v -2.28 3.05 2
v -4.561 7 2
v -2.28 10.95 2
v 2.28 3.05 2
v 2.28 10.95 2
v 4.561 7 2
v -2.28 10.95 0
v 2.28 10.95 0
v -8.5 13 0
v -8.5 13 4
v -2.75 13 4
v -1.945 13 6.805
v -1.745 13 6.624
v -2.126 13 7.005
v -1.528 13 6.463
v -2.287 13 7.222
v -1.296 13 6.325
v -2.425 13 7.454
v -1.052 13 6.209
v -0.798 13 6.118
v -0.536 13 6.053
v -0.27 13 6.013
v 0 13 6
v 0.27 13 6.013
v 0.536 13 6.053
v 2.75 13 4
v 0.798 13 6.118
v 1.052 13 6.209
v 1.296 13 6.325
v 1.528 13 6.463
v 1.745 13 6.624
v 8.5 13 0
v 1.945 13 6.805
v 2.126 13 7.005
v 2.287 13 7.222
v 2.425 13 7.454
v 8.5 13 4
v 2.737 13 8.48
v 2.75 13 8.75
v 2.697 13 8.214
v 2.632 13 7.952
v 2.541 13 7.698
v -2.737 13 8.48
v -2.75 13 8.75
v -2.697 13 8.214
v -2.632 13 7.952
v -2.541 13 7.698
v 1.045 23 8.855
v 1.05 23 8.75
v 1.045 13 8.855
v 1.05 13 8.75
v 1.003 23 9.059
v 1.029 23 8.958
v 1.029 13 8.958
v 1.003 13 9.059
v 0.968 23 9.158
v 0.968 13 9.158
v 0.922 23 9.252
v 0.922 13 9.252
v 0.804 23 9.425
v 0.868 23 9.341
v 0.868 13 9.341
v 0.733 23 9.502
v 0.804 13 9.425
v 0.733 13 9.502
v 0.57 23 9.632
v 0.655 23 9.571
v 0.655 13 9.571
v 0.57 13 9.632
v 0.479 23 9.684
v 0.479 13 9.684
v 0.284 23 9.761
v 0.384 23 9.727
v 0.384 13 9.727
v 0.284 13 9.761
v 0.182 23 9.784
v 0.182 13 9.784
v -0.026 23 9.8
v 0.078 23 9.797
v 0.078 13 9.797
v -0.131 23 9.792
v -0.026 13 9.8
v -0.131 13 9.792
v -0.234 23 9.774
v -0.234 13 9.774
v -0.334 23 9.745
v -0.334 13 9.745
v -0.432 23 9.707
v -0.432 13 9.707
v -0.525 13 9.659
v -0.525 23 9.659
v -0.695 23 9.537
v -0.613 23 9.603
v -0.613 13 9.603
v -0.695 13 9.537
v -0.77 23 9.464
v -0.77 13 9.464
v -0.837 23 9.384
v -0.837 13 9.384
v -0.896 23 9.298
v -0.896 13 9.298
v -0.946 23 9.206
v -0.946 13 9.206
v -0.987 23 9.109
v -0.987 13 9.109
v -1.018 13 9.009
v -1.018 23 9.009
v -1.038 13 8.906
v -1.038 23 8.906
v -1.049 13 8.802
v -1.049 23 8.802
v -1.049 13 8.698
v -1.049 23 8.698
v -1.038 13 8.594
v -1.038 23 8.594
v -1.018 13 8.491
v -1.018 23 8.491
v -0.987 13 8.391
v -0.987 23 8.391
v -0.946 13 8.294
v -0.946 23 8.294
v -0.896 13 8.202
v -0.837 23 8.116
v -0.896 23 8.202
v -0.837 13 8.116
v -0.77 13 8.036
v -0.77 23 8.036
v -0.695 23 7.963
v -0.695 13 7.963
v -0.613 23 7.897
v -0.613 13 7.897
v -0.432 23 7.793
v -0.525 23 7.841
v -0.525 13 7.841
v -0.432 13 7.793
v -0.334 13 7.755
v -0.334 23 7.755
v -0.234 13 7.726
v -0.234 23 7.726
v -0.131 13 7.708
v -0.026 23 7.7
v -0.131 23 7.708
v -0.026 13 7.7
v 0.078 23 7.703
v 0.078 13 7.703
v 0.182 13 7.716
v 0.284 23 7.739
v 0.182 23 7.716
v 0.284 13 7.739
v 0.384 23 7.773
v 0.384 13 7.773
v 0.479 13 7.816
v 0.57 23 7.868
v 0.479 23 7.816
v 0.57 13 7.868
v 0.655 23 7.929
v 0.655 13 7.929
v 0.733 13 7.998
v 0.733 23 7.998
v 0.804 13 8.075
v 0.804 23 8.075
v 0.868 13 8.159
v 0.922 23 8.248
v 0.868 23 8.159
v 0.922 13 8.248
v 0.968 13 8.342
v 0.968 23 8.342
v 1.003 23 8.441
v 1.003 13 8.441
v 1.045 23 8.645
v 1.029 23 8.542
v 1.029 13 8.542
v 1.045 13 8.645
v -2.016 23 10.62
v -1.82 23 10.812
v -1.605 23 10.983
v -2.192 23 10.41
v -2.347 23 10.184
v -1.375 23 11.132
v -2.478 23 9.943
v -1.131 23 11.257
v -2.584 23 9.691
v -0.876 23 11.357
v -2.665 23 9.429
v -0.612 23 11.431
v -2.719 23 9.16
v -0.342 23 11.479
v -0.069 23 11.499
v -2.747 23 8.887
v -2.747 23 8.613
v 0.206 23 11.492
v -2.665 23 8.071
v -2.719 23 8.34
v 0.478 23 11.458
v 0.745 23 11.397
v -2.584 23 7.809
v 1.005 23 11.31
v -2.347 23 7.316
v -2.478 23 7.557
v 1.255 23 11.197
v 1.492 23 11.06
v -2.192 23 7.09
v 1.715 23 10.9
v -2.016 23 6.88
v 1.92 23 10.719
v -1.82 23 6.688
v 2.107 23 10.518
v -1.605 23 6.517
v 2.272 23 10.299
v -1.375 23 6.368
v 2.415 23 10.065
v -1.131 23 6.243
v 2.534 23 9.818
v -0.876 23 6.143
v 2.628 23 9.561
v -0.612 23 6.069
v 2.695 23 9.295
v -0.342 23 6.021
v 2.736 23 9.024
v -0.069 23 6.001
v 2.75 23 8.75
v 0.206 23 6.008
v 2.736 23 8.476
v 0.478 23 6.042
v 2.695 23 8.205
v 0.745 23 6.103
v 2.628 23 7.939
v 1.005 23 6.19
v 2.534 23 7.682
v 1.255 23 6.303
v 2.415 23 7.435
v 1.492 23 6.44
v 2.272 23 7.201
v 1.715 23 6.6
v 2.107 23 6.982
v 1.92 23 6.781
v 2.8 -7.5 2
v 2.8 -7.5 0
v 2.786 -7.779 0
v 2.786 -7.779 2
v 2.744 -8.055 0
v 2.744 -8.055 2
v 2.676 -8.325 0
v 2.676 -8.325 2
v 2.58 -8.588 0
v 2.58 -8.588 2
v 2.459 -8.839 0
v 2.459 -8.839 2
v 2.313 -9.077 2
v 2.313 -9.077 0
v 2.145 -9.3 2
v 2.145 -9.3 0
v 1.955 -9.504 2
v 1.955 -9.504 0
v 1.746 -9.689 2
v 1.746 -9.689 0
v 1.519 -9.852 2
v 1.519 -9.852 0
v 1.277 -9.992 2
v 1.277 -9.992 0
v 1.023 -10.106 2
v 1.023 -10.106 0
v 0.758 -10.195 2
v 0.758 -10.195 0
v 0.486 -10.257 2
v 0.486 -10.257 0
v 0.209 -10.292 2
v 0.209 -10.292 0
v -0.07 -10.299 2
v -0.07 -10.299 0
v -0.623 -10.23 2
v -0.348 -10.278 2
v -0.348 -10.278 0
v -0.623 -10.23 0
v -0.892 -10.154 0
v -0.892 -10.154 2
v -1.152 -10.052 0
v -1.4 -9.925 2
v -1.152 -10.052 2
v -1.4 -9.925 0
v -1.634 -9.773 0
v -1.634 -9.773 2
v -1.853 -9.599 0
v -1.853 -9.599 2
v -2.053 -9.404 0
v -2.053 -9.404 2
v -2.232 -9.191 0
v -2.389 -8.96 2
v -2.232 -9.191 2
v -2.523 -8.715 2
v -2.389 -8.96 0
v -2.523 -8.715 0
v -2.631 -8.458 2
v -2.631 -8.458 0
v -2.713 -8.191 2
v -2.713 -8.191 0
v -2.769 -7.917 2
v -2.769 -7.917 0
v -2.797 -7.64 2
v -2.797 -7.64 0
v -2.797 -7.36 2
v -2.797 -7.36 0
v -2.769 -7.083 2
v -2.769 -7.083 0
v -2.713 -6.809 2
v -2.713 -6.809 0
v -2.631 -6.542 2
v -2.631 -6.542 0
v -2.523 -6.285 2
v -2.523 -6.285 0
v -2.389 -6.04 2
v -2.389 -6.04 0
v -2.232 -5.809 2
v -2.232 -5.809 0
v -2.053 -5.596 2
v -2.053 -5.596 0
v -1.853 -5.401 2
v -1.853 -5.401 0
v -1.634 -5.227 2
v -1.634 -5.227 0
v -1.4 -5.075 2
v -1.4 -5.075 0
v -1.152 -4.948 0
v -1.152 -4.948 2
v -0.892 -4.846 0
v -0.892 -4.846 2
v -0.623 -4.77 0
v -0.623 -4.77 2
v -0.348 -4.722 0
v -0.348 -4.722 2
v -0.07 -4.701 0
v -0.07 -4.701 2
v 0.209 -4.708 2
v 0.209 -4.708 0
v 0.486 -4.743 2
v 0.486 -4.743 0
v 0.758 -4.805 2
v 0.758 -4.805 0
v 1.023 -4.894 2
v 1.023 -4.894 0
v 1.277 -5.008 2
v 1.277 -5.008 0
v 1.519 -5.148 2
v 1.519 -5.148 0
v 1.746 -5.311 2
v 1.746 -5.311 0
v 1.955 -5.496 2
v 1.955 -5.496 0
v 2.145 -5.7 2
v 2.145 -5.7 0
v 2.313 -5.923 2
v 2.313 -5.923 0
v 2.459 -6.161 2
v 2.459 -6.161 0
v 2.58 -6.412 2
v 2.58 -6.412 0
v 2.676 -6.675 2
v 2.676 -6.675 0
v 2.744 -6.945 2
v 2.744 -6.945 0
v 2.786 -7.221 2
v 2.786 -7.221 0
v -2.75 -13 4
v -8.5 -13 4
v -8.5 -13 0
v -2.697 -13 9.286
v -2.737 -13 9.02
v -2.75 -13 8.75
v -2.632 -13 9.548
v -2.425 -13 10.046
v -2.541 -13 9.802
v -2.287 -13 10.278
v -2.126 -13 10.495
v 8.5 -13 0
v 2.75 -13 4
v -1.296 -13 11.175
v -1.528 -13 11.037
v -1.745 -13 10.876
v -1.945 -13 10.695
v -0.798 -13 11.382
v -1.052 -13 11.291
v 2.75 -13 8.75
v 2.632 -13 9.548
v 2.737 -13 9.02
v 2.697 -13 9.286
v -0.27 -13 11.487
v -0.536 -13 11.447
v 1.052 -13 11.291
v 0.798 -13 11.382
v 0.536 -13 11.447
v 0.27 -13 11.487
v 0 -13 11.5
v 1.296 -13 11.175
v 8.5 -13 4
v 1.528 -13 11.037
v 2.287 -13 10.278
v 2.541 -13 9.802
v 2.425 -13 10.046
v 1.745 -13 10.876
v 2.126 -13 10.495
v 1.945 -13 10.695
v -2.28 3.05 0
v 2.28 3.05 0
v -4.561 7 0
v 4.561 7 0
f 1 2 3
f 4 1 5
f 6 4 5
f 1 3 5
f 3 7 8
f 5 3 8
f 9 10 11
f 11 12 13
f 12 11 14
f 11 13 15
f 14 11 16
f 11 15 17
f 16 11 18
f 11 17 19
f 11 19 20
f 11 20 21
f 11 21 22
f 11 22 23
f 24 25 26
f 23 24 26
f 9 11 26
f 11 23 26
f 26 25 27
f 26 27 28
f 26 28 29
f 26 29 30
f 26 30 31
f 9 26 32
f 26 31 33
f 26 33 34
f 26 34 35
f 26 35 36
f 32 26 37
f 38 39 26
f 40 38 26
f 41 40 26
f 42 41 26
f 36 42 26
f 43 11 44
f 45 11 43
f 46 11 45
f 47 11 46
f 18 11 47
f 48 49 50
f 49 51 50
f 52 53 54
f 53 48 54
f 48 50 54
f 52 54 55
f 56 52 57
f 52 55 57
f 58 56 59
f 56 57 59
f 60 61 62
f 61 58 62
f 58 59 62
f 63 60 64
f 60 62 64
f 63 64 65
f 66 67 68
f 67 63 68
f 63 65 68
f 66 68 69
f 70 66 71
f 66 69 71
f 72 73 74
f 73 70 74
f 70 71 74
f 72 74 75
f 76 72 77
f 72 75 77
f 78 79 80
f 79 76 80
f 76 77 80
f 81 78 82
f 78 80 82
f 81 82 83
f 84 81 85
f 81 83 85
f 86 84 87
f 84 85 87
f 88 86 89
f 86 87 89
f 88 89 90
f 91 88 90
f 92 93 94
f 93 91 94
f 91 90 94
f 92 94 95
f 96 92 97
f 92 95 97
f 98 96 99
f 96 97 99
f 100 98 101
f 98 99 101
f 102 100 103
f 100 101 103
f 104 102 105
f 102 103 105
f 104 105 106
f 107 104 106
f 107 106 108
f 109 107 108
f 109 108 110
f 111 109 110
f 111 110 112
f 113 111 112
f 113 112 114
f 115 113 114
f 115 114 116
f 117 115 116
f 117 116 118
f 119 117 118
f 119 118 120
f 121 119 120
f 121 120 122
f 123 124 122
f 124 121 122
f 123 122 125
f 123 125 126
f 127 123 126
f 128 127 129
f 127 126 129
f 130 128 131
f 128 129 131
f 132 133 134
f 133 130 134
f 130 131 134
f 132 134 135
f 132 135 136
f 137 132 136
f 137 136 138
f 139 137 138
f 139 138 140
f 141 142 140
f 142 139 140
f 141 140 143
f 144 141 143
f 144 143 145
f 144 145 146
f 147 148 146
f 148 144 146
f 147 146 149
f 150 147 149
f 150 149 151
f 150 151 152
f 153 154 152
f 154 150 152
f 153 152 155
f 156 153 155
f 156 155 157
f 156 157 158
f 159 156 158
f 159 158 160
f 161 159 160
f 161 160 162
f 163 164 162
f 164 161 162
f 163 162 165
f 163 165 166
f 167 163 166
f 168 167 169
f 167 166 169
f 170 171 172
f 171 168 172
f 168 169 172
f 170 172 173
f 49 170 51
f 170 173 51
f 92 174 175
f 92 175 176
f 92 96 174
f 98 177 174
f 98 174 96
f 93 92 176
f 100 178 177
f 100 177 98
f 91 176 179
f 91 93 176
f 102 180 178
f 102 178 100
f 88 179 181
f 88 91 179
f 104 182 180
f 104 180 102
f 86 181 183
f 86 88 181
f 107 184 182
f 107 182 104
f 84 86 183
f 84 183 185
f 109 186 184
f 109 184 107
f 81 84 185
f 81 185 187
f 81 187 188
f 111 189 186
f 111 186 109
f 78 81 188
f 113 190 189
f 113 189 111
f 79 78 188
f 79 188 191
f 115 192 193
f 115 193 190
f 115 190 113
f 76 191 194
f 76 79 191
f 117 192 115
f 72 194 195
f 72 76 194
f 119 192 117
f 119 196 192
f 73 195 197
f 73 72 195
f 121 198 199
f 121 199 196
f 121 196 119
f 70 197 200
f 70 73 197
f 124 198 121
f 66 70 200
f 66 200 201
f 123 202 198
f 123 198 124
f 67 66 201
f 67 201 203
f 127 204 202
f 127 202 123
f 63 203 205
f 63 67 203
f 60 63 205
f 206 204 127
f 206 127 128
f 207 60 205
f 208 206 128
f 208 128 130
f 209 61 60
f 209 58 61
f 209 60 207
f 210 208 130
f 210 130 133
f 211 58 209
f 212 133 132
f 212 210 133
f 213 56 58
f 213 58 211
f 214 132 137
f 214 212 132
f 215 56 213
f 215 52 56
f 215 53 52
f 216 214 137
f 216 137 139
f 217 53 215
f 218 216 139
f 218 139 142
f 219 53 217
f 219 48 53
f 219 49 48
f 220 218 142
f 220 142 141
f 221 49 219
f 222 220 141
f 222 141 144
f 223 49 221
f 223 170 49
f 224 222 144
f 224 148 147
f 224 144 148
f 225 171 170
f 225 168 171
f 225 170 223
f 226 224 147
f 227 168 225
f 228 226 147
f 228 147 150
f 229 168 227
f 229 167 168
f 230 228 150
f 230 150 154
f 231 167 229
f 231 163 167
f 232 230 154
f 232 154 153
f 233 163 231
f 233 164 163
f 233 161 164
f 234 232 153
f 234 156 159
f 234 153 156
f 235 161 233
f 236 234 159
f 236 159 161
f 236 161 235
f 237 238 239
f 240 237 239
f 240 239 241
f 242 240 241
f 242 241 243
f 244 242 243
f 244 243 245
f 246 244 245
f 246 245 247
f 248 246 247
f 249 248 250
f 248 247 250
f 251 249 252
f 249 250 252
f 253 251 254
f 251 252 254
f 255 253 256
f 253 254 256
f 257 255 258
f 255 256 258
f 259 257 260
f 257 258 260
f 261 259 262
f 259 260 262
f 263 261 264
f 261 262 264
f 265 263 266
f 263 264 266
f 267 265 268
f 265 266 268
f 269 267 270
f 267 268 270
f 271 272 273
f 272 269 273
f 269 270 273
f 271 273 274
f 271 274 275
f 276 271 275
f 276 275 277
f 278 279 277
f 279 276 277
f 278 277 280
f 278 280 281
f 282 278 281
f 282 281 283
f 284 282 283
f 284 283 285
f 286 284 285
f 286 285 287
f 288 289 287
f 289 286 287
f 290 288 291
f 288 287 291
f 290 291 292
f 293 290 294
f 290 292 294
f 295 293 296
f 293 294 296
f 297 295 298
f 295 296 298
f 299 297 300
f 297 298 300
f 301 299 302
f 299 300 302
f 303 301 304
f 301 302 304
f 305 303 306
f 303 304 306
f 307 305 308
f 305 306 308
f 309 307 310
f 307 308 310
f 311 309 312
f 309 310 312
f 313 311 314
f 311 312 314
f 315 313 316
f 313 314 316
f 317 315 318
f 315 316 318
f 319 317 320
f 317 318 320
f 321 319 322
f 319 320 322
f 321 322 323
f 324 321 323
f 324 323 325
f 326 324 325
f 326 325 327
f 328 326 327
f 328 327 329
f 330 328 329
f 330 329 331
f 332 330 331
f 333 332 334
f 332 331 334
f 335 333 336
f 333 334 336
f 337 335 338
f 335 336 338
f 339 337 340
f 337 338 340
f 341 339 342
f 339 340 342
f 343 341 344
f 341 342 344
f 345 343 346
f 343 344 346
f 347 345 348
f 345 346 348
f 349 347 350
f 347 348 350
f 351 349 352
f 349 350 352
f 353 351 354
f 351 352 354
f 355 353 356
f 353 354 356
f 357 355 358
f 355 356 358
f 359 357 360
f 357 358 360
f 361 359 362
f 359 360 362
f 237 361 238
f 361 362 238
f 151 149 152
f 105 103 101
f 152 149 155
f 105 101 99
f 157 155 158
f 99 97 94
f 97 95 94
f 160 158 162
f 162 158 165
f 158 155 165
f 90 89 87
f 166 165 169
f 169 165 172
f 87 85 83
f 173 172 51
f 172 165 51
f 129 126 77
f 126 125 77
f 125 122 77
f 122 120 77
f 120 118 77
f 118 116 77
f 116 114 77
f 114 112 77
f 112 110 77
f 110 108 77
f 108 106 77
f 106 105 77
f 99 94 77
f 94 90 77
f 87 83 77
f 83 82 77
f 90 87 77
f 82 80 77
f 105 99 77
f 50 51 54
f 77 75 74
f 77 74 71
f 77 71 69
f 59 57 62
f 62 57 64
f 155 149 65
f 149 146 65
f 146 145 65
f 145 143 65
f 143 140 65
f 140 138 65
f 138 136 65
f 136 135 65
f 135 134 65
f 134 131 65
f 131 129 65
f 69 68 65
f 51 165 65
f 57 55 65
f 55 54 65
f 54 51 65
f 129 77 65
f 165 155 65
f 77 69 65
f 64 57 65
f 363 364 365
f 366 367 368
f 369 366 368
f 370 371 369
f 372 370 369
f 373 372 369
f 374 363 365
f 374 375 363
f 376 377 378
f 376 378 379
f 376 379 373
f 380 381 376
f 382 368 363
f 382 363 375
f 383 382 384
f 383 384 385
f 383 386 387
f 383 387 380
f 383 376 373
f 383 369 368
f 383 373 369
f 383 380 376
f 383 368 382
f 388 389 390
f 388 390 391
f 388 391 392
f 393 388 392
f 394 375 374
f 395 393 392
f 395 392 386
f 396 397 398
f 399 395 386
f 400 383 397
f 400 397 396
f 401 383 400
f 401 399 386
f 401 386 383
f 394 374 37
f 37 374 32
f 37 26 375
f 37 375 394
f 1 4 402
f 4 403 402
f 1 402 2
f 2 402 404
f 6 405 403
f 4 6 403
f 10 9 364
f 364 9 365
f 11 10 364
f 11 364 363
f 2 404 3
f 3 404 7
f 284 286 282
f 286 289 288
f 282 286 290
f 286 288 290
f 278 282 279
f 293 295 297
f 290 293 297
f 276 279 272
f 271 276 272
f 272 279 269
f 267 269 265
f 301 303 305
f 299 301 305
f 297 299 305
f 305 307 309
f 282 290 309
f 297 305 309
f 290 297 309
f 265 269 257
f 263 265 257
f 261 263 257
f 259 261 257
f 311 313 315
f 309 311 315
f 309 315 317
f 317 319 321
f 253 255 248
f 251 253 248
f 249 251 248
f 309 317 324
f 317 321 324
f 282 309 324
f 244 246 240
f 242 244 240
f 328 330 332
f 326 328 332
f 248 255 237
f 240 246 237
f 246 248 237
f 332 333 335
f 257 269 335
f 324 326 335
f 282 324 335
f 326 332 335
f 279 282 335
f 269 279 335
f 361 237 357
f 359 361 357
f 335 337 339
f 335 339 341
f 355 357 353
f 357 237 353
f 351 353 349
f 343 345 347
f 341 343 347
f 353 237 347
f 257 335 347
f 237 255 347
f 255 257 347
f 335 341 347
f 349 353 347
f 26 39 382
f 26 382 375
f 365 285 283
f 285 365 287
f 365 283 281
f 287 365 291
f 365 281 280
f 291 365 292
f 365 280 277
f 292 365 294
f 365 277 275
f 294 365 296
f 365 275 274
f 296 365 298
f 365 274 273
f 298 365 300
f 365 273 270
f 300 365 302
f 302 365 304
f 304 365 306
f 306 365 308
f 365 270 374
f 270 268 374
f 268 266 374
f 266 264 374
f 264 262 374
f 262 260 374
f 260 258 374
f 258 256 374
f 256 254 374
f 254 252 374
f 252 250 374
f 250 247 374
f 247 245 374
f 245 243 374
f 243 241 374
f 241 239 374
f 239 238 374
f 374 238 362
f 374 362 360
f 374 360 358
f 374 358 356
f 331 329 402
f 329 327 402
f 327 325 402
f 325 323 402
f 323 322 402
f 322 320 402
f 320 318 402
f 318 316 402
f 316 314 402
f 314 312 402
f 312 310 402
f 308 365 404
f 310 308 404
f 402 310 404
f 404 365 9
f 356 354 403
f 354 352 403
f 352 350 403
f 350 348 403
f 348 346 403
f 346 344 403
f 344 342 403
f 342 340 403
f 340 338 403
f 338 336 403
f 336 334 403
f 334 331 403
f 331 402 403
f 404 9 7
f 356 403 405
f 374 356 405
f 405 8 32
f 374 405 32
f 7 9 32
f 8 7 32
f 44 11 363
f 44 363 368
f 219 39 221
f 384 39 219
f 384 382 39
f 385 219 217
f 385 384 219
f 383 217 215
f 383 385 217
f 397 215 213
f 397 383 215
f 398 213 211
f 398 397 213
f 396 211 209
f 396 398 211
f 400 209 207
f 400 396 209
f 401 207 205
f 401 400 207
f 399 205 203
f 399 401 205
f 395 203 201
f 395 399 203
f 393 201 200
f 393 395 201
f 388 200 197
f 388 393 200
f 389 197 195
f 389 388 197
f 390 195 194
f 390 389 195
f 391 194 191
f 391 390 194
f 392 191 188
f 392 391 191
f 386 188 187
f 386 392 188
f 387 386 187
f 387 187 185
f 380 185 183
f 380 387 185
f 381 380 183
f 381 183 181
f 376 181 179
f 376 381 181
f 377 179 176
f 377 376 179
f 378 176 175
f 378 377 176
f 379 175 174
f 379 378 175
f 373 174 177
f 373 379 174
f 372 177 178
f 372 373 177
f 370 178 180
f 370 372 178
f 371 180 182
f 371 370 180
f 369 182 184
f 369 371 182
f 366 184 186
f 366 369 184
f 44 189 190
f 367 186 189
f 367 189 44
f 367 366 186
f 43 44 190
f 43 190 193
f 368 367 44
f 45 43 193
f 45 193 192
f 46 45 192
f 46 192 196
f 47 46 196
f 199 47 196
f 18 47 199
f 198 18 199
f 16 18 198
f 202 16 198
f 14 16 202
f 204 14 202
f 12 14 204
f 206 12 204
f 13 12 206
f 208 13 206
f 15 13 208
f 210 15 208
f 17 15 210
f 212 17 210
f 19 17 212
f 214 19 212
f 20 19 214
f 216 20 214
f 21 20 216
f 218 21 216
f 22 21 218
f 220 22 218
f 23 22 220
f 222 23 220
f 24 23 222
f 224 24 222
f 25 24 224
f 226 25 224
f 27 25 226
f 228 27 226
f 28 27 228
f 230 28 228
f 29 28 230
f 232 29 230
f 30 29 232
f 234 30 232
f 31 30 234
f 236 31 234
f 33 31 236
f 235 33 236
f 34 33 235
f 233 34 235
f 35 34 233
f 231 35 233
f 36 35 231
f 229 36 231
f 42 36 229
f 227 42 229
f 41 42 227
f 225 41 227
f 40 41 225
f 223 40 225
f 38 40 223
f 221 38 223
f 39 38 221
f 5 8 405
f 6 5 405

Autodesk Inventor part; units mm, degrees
ref_plane "YZ Plane" through (0, 0, 0) normal (1, 0, 0) x (0, 1, 0)
ref_plane "XZ Plane" through (0, 0, 0) normal (0, 1, 0) x (-1, 0, 0)
ref_plane "XY Plane" through (0, 0, 0) normal (0, 0, 1) x (1, 0, 0)
sketch "Sketch1" plane through (0, 0, 0) normal (0, 0, 1) x (1, 0, 0)
  circle A0 centre (0, -7.5) radius 2.8 projected
  line L0 (-2.2805, 10.95) -> (2.2805, 10.95) projected
  line L1 (2.2805, 10.95) -> (4.5611, 7) projected
  line L2 (4.5611, 7) -> (2.2805, 3.05) projected
  line L3 (2.2805, 3.05) -> (-2.2805, 3.05) projected
  line L4 (-2.2805, 3.05) -> (-4.5611, 7) projected
  line L5 (-4.5611, 7) -> (-2.2805, 10.95) projected
  line L6 (8.5, 13) -> (-8.5, 13) projected
  line L7 (-8.5, 13) -> (-8.5, -13) projected
  line L8 (-8.5, -13) -> (8.5, -13) projected
  line L9 (8.5, -13) -> (8.5, 13) projected
  point P0 (0, 0)
extrude "Extrusion1" add sketch "Sketch1" along normal blind 2
sketch "Sketch2" plane through (0, 0, 2) normal (0, 0, 1) x (1, 0, 0)
  line L0 (8.5, -13) -> (8.5, 13) projected
  line L1 (8.5, 13) -> (-8.5, 13) projected
  line L2 (-8.5, 13) -> (-8.5, -13) projected
  line L3 (-8.5, -13) -> (8.5, -13) projected
  point P0 (0, 0)
extrude "Extrusion2" add sketch "Sketch2" along normal blind 2
sketch "Sketch3" plane through (-8.5, 13, 0) normal (0, 1, 0) x (1, 0, 0)
  circle A0 centre (8.5, -8.75) radius 2.75
  circle A1 centre (8.5, -8.75) radius 1.05
  line L0 (0, -4) -> (17, -4) construction
  line L1 (8.5, -4) -> (8.5, -22.1376) construction
  point P0 (8.5, 0)
  dimension "d4" = 5.5
  dimension "d5" = 2.1
  dimension "d6" = 4.75
extrude "Extrusion3" add sketch "Sketch3" along normal blind 10
sketch "Sketch4" plane through (0, 13, 8.75) normal (0, -1, 0) x (1, 0, 0)
  circle A0 centre (0, 0) radius 2.75 projected
  line L0 (-2.75, 0) -> (2.75, 0)
  line L1 (2.75, 0) -> (2.75, -4.75)
  line L2 (2.75, -4.75) -> (-2.75, -4.75)
  line L3 (-2.75, -4.75) -> (-2.75, 0)
  line L4 (-8.5, -4.75) -> (8.5, -4.75) projected
  point P0 (0, -8.75)
extrude "Extrusion4" add sketch "Sketch4" along normal up to surface (26 mm away)
properties part number "connector9V"
